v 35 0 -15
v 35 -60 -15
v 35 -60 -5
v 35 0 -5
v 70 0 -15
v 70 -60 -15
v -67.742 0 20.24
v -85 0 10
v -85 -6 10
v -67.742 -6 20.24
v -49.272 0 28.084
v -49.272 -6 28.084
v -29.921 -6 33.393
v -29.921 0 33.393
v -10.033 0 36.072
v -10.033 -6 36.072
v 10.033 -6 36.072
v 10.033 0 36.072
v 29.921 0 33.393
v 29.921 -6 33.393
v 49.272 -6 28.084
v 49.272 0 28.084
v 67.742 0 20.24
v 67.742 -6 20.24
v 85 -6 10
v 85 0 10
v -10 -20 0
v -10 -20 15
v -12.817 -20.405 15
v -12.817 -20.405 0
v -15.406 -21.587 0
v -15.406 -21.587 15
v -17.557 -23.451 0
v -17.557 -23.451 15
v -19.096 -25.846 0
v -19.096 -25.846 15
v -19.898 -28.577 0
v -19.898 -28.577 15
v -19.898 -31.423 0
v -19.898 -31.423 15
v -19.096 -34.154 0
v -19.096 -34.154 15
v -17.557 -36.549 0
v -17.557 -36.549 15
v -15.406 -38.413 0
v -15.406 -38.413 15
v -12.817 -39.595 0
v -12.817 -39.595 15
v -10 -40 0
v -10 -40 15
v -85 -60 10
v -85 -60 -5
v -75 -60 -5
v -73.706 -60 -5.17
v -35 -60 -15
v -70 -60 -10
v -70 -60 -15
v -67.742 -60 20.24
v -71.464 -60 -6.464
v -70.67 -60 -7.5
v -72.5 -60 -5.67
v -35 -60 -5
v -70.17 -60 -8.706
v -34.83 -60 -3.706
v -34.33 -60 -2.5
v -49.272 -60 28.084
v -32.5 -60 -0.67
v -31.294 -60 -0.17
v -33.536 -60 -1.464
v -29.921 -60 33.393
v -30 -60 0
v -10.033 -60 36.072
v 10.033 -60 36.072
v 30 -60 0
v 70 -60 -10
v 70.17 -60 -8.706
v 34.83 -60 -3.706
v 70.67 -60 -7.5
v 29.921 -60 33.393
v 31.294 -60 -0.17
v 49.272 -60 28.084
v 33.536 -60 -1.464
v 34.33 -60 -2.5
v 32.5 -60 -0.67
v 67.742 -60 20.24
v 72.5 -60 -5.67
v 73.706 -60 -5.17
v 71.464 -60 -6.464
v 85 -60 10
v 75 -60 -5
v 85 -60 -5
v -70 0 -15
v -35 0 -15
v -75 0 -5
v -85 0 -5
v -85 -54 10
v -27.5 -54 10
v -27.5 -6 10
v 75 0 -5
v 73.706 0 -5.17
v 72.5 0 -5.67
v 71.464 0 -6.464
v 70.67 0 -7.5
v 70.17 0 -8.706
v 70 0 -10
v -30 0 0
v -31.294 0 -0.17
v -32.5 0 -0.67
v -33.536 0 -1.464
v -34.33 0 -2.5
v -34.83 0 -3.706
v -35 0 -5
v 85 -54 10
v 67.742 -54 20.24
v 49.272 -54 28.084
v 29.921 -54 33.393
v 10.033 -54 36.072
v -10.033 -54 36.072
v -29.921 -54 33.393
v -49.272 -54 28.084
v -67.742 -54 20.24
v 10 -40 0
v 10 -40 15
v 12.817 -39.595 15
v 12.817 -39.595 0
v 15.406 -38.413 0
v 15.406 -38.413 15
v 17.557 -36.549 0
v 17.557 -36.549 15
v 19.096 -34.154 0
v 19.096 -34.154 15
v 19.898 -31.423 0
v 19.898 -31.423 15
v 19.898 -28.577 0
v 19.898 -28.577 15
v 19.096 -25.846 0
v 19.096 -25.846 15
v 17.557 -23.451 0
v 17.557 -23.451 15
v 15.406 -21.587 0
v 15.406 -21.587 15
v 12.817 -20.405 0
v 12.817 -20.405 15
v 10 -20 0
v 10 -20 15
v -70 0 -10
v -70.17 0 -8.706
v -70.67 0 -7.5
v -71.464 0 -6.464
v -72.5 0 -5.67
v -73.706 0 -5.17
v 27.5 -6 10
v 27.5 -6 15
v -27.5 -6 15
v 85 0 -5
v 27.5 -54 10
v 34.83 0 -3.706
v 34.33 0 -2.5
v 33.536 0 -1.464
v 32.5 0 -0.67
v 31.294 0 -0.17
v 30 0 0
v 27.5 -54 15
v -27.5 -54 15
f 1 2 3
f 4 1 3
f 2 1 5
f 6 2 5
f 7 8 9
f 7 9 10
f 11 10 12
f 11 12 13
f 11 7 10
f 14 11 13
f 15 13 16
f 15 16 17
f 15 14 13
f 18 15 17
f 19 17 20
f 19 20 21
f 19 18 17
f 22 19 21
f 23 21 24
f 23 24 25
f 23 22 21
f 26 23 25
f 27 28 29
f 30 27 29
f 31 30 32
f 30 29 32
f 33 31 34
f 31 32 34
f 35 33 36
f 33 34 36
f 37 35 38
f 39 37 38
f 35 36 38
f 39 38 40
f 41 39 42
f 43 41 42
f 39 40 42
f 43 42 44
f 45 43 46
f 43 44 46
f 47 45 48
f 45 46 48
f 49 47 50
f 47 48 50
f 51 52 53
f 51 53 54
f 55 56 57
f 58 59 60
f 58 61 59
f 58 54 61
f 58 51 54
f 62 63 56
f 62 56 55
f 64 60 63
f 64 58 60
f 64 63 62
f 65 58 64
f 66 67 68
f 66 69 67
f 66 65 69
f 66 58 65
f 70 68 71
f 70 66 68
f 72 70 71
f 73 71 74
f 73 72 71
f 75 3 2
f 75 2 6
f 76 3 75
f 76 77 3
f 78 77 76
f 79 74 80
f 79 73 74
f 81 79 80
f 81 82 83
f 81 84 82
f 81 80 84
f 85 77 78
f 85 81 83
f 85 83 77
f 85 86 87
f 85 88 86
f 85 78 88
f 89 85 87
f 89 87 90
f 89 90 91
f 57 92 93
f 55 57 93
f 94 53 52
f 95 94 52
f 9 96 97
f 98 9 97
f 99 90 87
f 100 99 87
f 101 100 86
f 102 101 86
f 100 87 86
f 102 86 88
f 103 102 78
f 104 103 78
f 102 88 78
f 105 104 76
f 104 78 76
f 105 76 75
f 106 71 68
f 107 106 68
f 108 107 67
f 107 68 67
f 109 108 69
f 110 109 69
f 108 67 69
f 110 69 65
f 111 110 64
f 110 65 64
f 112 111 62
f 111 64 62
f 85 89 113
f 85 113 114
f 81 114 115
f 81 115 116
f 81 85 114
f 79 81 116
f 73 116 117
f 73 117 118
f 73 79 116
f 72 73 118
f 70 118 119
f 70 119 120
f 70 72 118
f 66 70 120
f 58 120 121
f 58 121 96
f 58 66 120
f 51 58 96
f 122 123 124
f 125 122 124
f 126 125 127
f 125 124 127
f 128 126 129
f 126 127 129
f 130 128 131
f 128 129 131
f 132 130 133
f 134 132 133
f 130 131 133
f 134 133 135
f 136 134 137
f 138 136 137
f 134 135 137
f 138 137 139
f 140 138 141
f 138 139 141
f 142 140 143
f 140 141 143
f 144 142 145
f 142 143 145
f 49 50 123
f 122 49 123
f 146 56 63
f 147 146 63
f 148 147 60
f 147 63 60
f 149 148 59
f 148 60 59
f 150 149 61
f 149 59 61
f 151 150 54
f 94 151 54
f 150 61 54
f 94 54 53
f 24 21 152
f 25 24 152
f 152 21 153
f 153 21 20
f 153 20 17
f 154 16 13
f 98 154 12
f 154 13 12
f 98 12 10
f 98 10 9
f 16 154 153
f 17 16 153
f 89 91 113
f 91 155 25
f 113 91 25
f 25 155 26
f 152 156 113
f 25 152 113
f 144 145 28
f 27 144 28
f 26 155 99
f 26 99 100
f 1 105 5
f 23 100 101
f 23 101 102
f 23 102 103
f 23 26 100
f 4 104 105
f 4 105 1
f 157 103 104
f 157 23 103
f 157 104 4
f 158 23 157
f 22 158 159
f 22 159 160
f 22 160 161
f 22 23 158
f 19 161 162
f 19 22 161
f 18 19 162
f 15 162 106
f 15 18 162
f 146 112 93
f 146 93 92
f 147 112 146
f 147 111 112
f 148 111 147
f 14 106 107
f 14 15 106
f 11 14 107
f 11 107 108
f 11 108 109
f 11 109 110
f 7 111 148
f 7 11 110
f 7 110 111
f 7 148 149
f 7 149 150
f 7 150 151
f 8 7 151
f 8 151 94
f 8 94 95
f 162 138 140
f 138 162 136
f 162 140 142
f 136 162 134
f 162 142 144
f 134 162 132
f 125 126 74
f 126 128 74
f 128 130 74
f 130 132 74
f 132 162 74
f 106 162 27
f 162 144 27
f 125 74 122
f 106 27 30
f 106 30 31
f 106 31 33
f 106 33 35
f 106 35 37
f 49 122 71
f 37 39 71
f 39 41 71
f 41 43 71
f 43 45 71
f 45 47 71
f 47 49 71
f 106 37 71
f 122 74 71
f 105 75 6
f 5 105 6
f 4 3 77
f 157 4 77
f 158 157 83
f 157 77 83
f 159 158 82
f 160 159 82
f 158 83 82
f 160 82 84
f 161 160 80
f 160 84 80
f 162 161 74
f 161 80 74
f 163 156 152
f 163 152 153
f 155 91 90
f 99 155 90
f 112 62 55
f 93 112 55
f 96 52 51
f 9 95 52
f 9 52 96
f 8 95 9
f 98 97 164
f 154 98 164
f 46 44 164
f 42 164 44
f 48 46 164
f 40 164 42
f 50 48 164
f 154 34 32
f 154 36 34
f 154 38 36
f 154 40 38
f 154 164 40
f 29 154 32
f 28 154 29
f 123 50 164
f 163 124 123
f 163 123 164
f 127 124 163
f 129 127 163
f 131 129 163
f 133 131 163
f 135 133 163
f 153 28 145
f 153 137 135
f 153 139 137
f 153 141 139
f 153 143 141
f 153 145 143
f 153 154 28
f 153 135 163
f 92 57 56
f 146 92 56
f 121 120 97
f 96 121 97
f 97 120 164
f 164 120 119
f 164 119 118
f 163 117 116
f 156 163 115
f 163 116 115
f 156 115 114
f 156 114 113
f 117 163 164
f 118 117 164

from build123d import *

# Parameters (mm, degrees)
F0_W      = 170
F0_H      = 30
F1_DEPTH  = 60
F3_DEPTH  = 60.001
F5_DEPTH  = 60.001
F6_W      = 57.5
F6_H      = 5
F7_DEPTH  = 60.001
F8_DEPTH  = 60.001
F10_DEPTH = 6
F12_DEPTH = 6
F14_DEPTH = 30.001


with BuildPart() as f1:
    # F0 (on Front) → F1 (new body)
    with BuildSketch(Plane.XZ):
        Rectangle(F0_W, F0_H)
    extrude(amount=F1_DEPTH)

    # F2 (on face) → F3 (cut, through all)
    with BuildSketch(Plane.XZ.offset(60)):
        with BuildLine():
            Line((30, 0), (-30, 0))
            ThreePointArc((-30, 0), (-33.535534, -1.464466), (-35, -5))
            Line((-35, -5), (-35, -15))
            Line((-35, -15), (35, -15))
            Line((35, -15), (35, -5))
            ThreePointArc((35, -5), (33.535534, -1.464466), (30, 0))
        make_face()
    extrude(amount=-F3_DEPTH, mode=Mode.SUBTRACT)

    # F4 (on face) → F5 (cut, through all)
    with BuildSketch(Plane.XZ.offset(60)):
        with BuildLine():
            Line((-85, -15), (-70, -15))
            Line((-70, -15), (-70, -10))
            ThreePointArc((-70, -10), (-71.464466, -6.464466), (-75, -5))
            Line((-75, -5), (-85, -5))
            Line((-85, -5), (-85, -15))
        make_face()
        with BuildLine():
            Line((70, -10), (70, -15))
            Line((70, -15), (85, -15))
            Line((85, -15), (85, -5))
            Line((85, -5), (75, -5))
            ThreePointArc((75, -5), (71.464466, -6.464466), (70, -10))
        make_face()
    extrude(amount=-F5_DEPTH, mode=Mode.SUBTRACT)

    # F6 (on face) → F7 (cut, through all)
    with BuildSketch(Plane.XZ.offset(60)):
        with Locations((56.25, 12.5)):
            Rectangle(F6_W, F6_H)
        with Locations((-56.25, 12.5)):
            Rectangle(F6_W, F6_H)
    extrude(amount=-F7_DEPTH, mode=Mode.SUBTRACT)

    # F6 (on face) → F8 (cut, through all)
    with BuildSketch(Plane.XZ.offset(60)):
        with Locations((56.25, 12.5)):
            Rectangle(F6_W, F6_H)
        with Locations((-56.25, 12.5)):
            Rectangle(F6_W, F6_H)
    extrude(amount=-F8_DEPTH, mode=Mode.SUBTRACT)

    # F9 (on face) → F10 (join)
    with BuildSketch(Plane.XZ.offset(60)):
        with BuildLine():
            Line((27.5, 10), (85, 10))
            ThreePointArc((85, 10), (0, 36.407929), (-85, 10))
            Line((-85, 10), (-27.5, 10))
            Line((-27.5, 10), (-27.5, 15))
            Line((-27.5, 15), (27.5, 15))
            Line((27.5, 15), (27.5, 10))
        make_face()
    extrude(amount=-F10_DEPTH)

    # F11 (on face) → F12 (join)
    with BuildSketch(Plane(origin=(0, 0, 0), x_dir=(-1, 0, 0), z_dir=(0, 1, 0))):
        with BuildLine():
            Line((27.5, 10), (85, 10))
            ThreePointArc((85, 10), (0, 36.407929), (-85, 10))
            Line((-85, 10), (-27.5, 10))
            Line((-27.5, 10), (-27.5, 15))
            Line((-27.5, 15), (27.5, 15))
            Line((27.5, 15), (27.5, 10))
        make_face()
    extrude(amount=-F12_DEPTH)

    # F13 (on face) → F14 (cut, through all)
    with BuildSketch(Plane.XY.offset(15)):
        with BuildLine():
            Line((10, -20), (-10, -20))
            ThreePointArc((-10, -20), (-20, -30), (-10, -40))
            Line((-10, -40), (10, -40))
            ThreePointArc((10, -40), (20, -30), (10, -20))
        make_face()
    extrude(amount=-F14_DEPTH, mode=Mode.SUBTRACT)


solid = f1.part
